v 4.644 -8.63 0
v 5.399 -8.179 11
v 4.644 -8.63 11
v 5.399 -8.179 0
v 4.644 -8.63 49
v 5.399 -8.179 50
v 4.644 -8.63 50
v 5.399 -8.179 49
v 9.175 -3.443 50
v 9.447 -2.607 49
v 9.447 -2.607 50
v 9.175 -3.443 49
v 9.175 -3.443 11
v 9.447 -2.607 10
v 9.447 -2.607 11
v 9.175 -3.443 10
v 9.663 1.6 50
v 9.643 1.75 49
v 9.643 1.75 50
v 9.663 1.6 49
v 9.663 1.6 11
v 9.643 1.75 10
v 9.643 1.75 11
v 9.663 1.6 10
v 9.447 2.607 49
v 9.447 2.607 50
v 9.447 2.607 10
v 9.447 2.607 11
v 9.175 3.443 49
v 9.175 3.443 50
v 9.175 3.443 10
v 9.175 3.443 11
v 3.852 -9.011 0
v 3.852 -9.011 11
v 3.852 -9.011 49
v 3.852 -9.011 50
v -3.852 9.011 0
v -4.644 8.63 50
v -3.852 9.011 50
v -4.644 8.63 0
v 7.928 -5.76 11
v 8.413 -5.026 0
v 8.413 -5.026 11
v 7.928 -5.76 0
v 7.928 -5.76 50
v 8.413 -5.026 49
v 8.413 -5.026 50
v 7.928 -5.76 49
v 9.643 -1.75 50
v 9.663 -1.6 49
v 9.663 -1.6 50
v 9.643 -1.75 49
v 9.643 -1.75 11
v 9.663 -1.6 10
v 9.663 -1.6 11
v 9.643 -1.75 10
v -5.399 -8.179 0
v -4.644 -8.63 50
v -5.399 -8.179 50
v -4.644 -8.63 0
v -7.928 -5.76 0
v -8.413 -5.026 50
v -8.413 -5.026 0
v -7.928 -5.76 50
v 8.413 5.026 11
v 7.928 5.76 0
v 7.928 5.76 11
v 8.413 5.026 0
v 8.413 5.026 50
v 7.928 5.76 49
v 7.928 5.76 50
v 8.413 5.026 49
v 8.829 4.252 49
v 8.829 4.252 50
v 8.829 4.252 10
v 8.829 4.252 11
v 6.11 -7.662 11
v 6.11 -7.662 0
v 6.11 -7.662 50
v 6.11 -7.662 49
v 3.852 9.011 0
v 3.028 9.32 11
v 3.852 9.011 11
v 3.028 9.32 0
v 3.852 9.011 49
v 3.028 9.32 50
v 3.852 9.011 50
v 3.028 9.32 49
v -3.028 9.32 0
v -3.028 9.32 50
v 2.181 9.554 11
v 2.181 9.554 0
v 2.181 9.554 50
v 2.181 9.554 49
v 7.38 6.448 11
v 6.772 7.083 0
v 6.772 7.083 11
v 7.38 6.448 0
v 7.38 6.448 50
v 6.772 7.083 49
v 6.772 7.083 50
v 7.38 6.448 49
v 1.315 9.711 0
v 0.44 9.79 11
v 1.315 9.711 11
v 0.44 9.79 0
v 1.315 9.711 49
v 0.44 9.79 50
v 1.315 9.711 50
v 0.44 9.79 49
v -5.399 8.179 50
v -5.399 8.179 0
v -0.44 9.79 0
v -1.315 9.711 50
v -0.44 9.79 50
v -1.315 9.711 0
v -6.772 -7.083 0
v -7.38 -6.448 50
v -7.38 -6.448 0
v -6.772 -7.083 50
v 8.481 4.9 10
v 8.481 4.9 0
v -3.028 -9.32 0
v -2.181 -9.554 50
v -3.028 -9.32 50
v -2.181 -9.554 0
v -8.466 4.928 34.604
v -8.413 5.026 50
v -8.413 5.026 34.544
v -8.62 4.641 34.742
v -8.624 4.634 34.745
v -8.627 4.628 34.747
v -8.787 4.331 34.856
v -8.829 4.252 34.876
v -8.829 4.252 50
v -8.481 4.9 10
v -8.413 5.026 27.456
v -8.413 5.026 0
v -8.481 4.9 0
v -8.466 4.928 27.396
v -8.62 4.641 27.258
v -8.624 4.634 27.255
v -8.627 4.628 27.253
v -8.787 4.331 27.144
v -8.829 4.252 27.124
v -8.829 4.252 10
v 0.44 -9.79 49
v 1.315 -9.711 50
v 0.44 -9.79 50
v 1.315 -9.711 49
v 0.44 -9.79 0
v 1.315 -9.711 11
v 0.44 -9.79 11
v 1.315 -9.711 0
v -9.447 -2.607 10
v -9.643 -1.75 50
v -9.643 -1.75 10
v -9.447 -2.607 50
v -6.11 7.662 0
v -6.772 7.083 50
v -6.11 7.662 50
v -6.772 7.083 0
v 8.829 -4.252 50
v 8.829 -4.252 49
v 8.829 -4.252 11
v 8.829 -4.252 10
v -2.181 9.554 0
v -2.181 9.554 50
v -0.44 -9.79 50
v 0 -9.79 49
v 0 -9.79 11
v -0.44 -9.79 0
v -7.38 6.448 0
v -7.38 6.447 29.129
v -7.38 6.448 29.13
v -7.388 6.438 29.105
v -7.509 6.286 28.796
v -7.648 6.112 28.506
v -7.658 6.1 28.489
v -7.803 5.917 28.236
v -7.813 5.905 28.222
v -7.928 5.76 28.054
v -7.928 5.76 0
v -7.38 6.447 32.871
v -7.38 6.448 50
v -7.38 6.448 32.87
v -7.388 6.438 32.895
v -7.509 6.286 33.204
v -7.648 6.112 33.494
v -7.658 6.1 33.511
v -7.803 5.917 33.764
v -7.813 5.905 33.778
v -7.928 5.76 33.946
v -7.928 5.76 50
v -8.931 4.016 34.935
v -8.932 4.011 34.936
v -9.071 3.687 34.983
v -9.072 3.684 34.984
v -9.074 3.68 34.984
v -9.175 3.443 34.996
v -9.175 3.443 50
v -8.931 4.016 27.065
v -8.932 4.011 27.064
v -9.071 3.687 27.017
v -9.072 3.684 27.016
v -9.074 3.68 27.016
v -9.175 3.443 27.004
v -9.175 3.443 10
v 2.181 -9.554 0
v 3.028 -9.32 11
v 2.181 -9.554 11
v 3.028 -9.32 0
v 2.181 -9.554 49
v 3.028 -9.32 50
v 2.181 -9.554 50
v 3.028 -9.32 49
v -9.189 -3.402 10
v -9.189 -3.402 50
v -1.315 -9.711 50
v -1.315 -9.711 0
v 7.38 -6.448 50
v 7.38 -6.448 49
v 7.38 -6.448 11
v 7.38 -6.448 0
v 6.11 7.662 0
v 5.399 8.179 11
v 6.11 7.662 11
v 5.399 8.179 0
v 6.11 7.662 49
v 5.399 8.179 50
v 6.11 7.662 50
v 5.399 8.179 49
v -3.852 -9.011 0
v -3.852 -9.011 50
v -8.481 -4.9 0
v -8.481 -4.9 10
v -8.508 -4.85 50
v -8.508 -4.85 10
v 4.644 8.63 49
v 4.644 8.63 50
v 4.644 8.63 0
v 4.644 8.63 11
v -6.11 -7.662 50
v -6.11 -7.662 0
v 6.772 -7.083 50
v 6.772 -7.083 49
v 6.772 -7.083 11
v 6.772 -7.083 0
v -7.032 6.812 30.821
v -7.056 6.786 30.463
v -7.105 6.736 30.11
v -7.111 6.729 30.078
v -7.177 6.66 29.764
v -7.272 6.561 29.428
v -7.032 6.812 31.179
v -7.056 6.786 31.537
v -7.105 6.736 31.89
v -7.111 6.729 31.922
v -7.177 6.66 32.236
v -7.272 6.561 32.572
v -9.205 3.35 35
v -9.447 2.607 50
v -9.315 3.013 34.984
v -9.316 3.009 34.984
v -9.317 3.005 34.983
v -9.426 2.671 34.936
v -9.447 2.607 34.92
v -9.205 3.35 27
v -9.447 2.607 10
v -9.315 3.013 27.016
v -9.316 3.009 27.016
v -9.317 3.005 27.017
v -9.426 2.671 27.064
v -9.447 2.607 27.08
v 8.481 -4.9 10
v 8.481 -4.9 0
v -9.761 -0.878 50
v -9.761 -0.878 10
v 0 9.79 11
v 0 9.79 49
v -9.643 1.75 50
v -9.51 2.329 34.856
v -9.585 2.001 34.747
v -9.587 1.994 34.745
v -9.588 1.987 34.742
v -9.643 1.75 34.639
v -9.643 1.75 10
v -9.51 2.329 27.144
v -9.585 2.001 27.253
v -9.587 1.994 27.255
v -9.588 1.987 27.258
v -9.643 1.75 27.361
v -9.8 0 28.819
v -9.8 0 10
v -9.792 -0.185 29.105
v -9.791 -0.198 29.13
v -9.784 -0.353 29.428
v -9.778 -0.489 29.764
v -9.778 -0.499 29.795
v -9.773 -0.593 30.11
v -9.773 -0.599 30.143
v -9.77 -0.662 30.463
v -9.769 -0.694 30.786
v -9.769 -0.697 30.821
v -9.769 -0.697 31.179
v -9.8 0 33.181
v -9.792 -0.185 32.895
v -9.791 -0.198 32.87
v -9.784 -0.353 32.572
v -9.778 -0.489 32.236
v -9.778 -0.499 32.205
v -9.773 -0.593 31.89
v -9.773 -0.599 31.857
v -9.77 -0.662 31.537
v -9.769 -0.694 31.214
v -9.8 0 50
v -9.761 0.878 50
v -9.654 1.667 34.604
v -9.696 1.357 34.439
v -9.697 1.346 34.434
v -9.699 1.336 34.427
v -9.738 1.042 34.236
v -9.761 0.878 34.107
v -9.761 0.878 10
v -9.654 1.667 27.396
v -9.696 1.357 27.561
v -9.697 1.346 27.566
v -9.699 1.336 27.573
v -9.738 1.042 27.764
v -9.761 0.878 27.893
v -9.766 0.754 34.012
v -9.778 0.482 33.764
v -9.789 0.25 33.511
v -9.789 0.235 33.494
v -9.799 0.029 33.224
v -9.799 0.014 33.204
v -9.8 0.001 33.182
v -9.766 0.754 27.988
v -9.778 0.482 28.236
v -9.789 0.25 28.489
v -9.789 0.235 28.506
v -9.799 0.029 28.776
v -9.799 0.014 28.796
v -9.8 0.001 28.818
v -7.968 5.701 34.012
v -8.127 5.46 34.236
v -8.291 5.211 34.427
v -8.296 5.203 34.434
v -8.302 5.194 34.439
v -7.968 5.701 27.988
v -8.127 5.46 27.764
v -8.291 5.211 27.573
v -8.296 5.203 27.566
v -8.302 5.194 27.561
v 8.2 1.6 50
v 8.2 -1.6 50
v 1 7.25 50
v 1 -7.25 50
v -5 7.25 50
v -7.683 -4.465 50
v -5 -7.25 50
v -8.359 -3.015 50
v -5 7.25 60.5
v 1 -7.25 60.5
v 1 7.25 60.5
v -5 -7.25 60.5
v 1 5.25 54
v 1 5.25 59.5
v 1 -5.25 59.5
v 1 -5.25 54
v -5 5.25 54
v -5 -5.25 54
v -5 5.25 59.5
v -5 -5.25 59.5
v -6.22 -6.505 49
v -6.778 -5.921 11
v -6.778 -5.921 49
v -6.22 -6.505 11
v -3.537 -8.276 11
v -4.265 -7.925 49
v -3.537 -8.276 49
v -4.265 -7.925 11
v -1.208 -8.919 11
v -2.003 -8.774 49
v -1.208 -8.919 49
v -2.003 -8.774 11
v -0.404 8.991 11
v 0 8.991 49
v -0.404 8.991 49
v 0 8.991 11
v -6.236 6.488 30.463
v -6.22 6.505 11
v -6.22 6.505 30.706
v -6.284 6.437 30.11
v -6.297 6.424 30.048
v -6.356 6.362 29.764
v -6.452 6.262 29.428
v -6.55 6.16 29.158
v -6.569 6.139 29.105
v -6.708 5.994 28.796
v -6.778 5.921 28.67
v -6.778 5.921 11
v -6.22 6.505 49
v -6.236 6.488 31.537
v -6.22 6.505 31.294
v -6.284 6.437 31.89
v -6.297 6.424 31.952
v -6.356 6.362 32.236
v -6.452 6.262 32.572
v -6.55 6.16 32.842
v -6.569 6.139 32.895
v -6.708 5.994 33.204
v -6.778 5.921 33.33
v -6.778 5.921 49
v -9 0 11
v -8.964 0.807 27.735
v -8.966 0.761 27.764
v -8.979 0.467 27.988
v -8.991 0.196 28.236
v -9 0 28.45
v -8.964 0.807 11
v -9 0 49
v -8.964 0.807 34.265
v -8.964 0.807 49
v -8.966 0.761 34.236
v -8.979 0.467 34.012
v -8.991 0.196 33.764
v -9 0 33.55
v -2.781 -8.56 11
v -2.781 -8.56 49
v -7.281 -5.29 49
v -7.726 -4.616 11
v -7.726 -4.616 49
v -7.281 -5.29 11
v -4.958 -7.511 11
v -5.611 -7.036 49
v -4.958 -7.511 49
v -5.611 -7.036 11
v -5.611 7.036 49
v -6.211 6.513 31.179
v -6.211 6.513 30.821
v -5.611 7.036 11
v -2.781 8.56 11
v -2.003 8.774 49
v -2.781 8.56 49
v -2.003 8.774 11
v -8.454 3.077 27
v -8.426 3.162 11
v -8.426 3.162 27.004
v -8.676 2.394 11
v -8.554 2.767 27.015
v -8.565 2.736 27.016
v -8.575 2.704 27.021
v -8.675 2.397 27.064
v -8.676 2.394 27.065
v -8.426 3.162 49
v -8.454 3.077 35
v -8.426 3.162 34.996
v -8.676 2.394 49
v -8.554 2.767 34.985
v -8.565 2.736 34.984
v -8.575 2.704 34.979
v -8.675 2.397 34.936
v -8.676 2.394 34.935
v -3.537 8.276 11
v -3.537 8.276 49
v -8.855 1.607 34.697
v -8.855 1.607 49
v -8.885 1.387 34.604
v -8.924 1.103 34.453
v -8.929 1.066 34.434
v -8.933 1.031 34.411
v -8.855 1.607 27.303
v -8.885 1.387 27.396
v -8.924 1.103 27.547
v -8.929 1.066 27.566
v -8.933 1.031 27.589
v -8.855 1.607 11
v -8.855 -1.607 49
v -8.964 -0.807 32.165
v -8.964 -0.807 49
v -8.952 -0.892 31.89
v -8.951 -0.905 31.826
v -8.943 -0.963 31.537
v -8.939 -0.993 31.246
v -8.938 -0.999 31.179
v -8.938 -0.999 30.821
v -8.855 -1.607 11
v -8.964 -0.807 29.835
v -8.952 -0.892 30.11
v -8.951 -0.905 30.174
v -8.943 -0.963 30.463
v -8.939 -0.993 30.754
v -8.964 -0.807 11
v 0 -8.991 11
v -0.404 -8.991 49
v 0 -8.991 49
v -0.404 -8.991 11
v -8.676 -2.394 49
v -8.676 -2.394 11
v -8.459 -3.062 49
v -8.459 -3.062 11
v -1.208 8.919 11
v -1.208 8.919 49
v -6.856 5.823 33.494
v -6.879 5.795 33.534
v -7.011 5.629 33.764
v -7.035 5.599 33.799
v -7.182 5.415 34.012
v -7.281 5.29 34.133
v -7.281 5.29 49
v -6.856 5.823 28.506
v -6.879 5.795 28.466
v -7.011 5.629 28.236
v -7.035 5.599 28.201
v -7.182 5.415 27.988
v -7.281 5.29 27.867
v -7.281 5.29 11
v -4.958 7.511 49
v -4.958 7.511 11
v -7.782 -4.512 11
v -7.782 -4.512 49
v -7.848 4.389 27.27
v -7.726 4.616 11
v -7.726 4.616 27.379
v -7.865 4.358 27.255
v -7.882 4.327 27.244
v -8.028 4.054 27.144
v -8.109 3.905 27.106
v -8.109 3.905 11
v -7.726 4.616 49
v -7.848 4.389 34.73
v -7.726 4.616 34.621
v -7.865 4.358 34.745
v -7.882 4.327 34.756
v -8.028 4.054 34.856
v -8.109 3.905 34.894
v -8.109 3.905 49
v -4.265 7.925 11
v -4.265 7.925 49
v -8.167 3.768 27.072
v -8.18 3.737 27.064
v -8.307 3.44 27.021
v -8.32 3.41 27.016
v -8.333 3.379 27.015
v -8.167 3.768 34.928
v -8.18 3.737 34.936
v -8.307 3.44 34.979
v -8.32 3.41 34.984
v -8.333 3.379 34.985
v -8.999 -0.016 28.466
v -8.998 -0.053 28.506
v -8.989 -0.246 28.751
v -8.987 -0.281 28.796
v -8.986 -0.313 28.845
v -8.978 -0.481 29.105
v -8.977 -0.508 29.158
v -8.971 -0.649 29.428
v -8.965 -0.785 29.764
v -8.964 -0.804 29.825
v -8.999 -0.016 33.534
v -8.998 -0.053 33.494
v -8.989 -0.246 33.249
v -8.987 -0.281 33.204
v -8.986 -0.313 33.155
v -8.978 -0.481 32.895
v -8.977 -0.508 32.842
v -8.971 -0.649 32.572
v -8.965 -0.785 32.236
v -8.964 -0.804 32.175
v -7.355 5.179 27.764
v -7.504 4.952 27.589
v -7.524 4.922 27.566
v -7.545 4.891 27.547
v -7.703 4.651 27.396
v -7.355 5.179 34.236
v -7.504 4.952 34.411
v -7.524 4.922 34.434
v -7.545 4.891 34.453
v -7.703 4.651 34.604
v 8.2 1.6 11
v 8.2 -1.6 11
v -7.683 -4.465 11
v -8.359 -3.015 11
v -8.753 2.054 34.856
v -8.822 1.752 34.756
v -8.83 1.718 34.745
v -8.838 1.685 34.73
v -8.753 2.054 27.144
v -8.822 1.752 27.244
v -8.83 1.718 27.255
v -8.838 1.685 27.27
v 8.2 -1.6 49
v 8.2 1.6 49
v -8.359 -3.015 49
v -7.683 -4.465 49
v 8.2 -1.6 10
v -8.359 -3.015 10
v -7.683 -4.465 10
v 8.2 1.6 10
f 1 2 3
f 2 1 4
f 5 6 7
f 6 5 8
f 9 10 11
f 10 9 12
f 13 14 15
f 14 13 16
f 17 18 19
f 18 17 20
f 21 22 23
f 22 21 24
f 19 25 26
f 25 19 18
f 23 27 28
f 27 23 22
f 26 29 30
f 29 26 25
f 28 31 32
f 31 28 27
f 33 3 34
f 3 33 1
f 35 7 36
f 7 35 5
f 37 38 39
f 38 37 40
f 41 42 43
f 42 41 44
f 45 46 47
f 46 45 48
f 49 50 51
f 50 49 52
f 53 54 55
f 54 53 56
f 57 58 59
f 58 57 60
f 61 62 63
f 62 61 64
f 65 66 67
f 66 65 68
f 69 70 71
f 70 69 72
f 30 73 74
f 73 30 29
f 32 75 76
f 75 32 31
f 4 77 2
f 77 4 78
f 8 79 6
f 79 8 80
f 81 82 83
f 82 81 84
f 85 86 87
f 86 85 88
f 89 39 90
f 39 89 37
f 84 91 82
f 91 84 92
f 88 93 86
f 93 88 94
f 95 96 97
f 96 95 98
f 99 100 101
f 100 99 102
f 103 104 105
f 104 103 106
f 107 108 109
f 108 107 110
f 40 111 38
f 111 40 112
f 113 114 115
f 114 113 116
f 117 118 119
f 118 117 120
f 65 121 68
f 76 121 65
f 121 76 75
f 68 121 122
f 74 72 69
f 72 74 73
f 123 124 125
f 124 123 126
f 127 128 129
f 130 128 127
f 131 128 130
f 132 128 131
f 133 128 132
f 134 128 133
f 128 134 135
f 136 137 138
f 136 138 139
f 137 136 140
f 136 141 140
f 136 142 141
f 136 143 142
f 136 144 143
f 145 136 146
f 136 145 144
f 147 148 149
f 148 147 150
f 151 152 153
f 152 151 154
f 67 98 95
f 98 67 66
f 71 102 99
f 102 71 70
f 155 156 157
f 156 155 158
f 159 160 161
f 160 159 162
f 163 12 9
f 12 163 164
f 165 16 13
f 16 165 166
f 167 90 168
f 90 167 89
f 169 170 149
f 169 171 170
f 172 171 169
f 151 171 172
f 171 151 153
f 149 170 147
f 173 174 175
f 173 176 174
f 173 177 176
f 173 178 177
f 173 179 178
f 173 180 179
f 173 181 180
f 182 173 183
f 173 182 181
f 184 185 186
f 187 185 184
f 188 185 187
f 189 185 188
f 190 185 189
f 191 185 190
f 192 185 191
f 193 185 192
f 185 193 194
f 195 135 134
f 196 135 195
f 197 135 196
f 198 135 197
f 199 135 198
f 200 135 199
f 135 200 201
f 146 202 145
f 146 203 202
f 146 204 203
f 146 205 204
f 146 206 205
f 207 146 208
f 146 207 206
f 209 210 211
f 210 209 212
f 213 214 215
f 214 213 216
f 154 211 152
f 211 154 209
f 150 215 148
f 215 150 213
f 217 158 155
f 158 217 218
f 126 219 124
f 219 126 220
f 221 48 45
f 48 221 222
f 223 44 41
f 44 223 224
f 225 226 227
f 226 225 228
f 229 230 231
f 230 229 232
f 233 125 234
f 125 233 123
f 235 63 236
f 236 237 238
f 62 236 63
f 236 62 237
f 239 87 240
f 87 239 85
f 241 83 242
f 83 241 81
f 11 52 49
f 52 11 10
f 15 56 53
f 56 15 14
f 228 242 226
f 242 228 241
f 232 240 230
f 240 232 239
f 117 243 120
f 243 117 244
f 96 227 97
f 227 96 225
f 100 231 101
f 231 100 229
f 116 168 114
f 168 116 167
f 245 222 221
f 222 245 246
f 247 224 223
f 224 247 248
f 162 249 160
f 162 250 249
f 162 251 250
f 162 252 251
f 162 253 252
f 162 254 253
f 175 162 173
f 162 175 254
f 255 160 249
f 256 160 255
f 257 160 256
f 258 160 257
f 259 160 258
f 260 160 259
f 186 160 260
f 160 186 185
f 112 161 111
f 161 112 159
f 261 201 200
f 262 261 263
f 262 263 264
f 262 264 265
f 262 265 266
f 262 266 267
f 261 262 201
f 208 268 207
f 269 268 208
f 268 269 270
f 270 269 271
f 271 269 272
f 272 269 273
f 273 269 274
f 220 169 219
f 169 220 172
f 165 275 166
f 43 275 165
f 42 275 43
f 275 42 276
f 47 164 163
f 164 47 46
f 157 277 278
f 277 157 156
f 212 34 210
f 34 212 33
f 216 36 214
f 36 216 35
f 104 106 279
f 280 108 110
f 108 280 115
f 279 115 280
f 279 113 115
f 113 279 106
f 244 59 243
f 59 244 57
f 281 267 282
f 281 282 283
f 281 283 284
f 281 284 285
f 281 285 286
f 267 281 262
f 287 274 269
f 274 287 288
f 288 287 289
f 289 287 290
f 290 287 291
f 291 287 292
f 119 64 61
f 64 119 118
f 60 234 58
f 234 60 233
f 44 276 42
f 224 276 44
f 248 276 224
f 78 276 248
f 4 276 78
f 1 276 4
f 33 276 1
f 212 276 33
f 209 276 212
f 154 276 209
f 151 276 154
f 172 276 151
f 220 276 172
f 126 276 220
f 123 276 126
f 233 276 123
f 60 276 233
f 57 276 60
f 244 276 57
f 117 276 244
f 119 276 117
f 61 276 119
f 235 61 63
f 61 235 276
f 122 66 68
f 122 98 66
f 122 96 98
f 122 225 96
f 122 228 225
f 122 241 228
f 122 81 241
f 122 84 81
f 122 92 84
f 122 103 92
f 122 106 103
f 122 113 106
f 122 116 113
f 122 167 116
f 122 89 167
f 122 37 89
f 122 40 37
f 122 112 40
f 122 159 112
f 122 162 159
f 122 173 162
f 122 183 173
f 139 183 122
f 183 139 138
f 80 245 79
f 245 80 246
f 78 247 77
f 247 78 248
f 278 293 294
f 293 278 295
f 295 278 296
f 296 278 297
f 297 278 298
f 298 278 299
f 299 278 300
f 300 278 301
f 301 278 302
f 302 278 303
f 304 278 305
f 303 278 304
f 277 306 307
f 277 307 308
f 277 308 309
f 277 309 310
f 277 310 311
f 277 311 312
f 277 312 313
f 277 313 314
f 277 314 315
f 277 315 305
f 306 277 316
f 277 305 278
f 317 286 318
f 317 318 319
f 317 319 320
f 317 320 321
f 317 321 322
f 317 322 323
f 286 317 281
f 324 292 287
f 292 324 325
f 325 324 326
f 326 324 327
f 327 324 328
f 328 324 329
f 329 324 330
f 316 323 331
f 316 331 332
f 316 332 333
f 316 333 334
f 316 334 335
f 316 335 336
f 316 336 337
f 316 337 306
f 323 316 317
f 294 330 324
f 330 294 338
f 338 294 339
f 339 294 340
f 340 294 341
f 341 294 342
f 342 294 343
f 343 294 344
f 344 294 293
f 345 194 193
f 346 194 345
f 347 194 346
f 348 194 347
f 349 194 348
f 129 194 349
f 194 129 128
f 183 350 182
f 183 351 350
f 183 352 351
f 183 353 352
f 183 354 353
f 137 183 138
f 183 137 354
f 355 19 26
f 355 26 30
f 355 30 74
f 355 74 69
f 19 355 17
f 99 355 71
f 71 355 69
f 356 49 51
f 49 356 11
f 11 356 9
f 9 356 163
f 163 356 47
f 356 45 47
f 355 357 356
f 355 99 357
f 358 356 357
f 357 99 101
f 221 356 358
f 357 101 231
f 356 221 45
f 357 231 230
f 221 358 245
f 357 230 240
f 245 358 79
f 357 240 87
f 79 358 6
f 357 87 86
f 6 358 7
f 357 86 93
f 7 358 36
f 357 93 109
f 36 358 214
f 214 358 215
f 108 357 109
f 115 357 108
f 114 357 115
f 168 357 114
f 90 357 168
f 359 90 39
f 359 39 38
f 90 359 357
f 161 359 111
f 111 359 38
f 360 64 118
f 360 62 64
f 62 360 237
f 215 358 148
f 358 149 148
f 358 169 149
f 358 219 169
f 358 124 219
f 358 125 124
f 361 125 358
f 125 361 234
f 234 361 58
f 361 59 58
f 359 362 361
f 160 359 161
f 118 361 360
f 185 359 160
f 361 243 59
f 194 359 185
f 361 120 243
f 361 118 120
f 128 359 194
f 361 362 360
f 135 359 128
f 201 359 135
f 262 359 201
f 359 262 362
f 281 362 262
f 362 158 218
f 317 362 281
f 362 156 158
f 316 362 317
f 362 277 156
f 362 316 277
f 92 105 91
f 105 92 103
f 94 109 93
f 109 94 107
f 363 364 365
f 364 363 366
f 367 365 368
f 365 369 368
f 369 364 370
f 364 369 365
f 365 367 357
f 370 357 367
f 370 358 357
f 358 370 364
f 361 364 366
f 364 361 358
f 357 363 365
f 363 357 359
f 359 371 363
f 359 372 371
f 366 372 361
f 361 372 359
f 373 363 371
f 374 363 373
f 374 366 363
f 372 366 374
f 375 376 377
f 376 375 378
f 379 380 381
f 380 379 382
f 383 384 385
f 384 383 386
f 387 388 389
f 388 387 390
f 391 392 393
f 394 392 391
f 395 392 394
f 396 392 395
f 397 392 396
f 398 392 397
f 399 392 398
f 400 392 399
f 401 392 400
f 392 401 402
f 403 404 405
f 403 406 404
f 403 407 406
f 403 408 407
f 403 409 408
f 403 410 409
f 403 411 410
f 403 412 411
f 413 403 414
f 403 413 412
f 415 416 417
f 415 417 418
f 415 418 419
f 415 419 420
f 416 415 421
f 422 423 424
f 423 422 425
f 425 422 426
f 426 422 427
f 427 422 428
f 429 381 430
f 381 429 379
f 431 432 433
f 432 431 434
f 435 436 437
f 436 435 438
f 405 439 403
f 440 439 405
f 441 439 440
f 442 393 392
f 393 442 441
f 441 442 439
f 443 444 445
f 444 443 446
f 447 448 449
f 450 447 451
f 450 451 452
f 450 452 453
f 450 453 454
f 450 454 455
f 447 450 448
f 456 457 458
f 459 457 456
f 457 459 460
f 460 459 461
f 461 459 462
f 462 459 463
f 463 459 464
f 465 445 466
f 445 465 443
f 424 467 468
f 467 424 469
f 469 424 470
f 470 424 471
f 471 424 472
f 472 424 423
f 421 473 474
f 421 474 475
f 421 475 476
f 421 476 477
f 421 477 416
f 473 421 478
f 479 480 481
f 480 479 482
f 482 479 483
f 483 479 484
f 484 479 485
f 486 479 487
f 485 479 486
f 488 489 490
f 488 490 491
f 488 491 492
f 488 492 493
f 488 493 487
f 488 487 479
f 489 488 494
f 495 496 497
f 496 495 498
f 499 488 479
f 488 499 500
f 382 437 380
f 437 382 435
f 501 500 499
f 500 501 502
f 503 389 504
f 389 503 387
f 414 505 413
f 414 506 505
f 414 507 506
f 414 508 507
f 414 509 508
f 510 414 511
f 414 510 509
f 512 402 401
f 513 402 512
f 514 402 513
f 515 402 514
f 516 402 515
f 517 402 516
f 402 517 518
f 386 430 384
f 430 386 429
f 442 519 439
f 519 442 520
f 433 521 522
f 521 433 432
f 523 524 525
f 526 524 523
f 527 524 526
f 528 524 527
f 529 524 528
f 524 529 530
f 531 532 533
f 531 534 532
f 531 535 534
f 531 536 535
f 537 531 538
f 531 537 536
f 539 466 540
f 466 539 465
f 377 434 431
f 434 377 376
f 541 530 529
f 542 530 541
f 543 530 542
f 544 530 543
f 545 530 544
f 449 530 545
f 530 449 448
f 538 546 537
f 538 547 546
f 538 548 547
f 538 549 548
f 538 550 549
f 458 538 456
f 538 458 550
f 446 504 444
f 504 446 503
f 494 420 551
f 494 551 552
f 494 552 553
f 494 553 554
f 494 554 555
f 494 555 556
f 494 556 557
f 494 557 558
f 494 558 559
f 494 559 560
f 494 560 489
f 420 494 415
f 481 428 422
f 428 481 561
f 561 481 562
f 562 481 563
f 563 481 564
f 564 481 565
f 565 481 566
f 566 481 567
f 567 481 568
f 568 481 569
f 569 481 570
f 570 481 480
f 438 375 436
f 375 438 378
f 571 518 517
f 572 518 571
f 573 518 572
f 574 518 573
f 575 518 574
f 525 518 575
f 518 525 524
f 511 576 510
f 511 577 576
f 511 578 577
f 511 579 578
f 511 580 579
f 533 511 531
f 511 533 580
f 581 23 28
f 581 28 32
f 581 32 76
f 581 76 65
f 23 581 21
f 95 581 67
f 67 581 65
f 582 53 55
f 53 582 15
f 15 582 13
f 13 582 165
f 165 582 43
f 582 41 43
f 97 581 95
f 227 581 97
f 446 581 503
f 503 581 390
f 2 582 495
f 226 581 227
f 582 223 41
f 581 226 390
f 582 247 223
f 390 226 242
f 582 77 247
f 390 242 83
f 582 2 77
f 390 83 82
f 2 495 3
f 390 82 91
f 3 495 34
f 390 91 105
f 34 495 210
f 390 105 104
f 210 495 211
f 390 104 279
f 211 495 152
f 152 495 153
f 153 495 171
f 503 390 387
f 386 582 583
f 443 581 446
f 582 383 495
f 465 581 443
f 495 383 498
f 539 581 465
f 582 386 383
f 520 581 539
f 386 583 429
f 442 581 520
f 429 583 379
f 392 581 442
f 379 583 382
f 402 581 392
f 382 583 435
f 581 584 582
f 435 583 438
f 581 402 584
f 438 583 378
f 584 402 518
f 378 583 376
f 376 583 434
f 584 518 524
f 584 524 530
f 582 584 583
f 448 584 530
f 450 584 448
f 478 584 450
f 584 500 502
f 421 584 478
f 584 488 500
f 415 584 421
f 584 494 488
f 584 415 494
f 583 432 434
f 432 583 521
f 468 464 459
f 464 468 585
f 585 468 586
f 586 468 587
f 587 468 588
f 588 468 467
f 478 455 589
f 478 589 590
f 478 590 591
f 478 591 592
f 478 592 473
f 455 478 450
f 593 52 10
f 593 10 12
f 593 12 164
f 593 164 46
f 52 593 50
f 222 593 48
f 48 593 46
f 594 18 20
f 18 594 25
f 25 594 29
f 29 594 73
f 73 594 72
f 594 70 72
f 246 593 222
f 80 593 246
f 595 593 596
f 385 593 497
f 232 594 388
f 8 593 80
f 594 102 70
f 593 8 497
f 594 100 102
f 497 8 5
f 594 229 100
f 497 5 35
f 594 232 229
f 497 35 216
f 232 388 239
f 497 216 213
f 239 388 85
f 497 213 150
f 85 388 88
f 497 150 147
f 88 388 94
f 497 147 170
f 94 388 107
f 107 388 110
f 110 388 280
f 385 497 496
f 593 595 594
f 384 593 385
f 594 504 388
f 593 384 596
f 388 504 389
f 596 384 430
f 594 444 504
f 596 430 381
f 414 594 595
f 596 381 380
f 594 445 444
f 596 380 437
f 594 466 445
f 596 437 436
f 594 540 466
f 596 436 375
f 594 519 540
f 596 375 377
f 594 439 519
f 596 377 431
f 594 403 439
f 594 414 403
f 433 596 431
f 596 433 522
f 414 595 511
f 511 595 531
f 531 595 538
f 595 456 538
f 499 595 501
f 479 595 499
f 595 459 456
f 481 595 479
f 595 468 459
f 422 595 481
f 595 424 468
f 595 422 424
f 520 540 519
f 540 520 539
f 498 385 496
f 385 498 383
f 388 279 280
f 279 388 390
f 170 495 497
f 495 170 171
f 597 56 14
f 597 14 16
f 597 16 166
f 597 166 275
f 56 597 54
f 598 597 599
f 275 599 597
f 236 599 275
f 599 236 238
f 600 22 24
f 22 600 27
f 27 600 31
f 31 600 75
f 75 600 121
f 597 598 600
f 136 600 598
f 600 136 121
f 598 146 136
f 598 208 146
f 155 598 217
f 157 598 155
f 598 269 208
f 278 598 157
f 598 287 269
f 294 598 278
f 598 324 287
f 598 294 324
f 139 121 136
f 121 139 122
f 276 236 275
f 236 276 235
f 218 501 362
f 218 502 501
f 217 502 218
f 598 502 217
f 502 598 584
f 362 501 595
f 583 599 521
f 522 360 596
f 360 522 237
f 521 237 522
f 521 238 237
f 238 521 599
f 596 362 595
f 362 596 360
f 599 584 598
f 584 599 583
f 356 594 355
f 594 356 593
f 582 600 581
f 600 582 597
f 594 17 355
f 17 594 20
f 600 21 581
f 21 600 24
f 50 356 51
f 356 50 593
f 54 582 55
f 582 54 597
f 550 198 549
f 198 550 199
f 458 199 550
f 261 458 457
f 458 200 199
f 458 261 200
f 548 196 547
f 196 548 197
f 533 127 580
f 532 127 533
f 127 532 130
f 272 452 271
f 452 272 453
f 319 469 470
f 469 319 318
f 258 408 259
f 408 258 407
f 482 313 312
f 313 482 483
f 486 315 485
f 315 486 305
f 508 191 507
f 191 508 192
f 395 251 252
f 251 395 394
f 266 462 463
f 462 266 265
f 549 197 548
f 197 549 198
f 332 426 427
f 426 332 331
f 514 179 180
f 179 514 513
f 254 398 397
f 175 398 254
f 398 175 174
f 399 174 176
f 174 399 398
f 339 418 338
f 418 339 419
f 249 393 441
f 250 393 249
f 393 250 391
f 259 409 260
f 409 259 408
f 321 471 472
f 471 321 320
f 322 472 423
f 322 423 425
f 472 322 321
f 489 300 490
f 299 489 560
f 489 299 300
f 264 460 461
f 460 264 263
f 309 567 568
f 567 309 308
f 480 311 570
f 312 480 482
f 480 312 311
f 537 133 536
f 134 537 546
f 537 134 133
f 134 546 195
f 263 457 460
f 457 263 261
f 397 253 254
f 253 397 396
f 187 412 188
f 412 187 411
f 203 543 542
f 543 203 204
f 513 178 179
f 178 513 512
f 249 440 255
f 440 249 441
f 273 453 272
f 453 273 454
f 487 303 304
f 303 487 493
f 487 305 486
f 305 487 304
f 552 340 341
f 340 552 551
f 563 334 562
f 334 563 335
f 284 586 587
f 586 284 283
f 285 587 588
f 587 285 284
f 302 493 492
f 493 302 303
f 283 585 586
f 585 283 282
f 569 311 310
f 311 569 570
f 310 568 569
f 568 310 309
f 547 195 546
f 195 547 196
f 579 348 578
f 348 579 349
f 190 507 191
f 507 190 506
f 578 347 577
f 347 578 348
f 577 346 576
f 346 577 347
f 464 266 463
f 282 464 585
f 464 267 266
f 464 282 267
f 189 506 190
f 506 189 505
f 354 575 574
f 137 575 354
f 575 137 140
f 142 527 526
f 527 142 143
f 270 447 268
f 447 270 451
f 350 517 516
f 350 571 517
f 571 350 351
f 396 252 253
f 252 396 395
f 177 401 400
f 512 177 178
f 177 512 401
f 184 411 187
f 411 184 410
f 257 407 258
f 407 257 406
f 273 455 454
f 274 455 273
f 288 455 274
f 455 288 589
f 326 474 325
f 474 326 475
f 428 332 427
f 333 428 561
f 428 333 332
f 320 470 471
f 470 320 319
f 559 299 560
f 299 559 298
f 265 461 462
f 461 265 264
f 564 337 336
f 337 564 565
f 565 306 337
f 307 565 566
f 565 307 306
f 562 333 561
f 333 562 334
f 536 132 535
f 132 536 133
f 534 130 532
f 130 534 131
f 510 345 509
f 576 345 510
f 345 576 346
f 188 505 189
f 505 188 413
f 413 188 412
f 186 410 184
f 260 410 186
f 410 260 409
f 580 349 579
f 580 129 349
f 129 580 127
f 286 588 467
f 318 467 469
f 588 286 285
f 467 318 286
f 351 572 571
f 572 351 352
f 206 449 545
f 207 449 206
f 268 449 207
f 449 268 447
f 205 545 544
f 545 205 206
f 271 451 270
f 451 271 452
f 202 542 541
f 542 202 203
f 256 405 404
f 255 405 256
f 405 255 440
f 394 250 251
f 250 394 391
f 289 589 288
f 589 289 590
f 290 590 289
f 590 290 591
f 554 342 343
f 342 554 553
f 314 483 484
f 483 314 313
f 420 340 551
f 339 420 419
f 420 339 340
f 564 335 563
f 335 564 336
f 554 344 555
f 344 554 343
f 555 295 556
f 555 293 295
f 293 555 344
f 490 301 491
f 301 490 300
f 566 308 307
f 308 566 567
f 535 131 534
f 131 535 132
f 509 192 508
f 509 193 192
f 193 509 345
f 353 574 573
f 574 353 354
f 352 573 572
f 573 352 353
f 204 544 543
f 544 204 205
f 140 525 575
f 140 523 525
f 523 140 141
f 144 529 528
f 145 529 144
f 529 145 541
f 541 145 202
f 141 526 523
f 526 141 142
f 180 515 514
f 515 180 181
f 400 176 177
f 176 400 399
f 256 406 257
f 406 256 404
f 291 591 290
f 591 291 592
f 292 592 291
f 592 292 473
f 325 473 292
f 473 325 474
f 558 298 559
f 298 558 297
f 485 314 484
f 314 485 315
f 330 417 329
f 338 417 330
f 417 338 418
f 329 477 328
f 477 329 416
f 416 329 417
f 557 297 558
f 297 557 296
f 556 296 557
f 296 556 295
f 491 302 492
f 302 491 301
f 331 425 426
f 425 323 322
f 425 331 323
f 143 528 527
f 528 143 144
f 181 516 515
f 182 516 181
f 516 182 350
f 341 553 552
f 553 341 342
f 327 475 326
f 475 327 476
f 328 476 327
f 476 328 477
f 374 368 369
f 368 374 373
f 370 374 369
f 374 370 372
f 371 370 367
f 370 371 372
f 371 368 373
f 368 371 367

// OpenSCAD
// INPUTS #############################

$fn = 70;

// MODULES ############################
// HELPERS ############################
// GLOBAL PARAMETERS ##################

function d_ext() = 19.6;
function d_batterie() = 18; // 15~17mm
function h_batterie() = 38; // ~35mm
function h_creux() = 10;
function h_espacement() = 1;
function d_ouverture() = 8;
function h_ouverture() = 20;
function decal_passage() = 25;
function decal_ouverture() = -20;
function p_ancre() = 6;
function c_ancre() = -1;
function l_carte() = 10.5;
function h_carte() = 5.5;
function espace_carte() = 4;

function h_ancre() = h_carte()+espace_carte()+h_espacement();
function l_ancre() = l_carte()+h_espacement()*4; // espacement * 2 de chaque côté
function l_passage() = (d_ext()-d_batterie())/2;
function h_passage() = h_espacement()*2+h_batterie();
function h_base_batterie() = h_creux()+h_espacement()*2+h_batterie();

// BASE ###############################

difference() {
    union() {
        cylinder(d=d_ext(), h=h_base_batterie()); // base de la batterie
        rotate([0,0,180])
        translate([c_ancre(),-l_ancre()/2,h_base_batterie()-0.1])
        cube([p_ancre(),l_ancre(),h_ancre()+0.1]); // base de l'ancre
    }
    translate([-(d_ext()/2+0.5),-d_ext()/4,-0.1])
    cube([d_ext()+1,d_ext()/2,h_creux()+0.1]); // creux pour l'interrupteur
    translate([0,0,h_creux()+h_espacement()])
    union() { // emplacement de la batterie
        cylinder(d=d_batterie(), h=h_batterie());
        translate([0,-(d_ext()/2+0.5),0])
        cube([d_ext()+0.1,d_ext()+1,h_batterie()]);
    }
    rotate([0,0,decal_passage()])
    translate([-(d_ext()/2),-(l_passage()),h_creux()-0.1])
    cube([l_passage()+0.15,l_passage()*2,h_passage()+0.2]); // passage du câble (arrière)
    translate([d_ext()/2-l_passage()*2,-(l_passage()*2),h_creux()-0.1])
    cube([l_passage()*2,l_passage()*4,h_passage()+0.2]); // passage du câble (avant)
    translate([0,0,h_creux()+h_espacement()+h_ouverture()])
    rotate([0,-90,decal_ouverture()])
    cylinder(d=d_ouverture(), h=d_ext()/2+0.1); // ouverture pour pousser la batterie
    rotate([0,0,180])
    translate([c_ancre()-0.1,-(l_carte()/2),h_base_batterie()+espace_carte()])
    cube([p_ancre()+0.2,l_carte(),h_carte()]); // trou pour la carte
}
